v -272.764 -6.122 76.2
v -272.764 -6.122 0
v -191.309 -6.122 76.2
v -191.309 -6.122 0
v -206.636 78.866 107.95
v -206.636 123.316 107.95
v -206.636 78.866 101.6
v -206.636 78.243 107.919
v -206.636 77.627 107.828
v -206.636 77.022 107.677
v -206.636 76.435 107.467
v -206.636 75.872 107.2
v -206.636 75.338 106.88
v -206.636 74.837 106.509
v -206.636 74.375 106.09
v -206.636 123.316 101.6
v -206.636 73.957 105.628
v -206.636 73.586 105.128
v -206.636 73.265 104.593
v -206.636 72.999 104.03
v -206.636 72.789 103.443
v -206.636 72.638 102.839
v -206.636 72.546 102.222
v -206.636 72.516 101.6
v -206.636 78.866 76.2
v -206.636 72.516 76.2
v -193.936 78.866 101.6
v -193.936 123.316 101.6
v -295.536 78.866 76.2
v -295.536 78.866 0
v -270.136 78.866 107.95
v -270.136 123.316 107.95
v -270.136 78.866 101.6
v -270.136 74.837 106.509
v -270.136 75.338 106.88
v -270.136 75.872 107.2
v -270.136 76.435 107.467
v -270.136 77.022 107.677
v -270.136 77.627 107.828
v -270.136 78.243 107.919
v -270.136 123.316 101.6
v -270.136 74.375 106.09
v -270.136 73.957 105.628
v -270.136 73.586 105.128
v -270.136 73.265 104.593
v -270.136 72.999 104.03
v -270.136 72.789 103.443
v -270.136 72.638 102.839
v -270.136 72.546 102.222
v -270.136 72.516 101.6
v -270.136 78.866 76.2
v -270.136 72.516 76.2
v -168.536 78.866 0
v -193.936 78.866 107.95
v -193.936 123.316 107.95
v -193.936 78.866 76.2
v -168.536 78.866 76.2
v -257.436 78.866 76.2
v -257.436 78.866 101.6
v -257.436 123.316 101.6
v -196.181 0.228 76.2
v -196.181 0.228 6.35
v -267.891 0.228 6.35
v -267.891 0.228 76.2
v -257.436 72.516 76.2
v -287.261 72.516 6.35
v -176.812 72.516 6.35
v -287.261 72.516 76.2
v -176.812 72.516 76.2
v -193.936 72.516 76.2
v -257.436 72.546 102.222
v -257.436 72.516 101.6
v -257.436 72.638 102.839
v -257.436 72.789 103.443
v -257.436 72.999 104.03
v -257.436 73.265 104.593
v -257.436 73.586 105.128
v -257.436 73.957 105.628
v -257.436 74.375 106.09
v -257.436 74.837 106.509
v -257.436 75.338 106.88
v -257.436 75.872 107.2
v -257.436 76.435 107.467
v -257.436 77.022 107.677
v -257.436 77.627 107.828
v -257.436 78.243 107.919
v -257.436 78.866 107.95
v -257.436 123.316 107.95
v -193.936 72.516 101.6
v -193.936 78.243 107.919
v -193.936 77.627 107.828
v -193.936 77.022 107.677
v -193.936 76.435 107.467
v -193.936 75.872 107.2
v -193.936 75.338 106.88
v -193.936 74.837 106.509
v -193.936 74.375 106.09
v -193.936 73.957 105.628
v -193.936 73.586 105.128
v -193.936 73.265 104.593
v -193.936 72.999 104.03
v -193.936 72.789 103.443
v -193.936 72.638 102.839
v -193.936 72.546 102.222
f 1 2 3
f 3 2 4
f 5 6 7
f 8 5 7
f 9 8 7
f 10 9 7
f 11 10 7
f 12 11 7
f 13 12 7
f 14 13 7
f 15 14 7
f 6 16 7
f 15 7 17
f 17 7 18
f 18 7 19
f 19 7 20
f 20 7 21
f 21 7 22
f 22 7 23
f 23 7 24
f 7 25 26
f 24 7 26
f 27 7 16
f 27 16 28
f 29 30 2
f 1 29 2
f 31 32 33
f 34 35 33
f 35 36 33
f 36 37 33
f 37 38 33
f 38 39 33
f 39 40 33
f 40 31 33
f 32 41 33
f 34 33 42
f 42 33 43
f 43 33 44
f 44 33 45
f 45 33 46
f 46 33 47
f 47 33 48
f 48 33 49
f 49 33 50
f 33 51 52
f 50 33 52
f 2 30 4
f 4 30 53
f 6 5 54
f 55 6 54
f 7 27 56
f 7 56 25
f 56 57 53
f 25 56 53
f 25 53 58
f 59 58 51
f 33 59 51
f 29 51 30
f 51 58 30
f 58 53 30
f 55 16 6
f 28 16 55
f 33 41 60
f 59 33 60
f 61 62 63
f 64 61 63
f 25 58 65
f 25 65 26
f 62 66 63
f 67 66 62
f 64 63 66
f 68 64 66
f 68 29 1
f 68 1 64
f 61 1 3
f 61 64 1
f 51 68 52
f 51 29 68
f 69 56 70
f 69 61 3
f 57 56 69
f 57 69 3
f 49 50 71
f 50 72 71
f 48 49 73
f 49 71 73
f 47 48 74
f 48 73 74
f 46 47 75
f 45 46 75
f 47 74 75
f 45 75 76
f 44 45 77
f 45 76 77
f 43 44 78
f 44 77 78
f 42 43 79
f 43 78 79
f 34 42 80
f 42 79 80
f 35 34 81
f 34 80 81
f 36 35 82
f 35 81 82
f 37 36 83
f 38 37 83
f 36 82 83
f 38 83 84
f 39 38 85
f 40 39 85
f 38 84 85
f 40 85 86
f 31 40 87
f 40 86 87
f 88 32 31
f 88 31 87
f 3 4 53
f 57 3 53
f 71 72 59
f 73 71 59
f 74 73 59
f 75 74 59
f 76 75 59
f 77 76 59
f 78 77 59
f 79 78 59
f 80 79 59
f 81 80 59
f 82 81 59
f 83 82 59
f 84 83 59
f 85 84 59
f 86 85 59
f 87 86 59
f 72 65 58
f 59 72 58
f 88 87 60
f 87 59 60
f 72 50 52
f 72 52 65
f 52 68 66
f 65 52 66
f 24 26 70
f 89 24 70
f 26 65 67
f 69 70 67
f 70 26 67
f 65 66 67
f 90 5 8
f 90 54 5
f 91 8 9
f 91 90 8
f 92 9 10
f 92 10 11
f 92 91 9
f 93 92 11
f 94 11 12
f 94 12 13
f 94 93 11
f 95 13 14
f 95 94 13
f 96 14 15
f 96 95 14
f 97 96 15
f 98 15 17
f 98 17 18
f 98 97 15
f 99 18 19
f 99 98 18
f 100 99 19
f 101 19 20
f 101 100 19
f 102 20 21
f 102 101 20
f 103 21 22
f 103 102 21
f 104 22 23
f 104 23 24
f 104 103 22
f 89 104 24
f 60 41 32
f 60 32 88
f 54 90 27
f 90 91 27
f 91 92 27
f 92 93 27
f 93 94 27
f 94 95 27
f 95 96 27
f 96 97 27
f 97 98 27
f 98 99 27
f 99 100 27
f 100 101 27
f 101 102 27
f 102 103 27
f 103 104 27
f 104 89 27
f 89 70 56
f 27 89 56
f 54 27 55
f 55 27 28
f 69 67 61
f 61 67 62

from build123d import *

# Parameters (mm, degrees)
F1_DEPTH = 76.2
F2_DEPTH = 6.35
F3_W     = 12.7
F3_H     = 25.4
F4_DEPTH = 6.35
F5_W     = 12.7
F5_H     = 6.35
F5_H_2   = 44.45
F6_DEPTH = 6.35
F7_W     = 12.7
F7_H     = 44.45
F7_H_2   = 6.35
F8_DEPTH = 6.35
F9_R     = 6.35
F10_R    = 6.35


with BuildPart() as f1:
    # F0 (on Top) → F1 (new body)
    with BuildSketch(Plane.XY):
        Polygon((-191.3085826457, -6.122033637), (-168.5362336709, 78.8655297446), (-295.5362336709, 78.8655297446), (-272.7638846962, -6.122033637), align=None)
        Polygon((-267.8913583225, 0.227966363), (-287.2607525534, 72.5155297446), (-176.8117147885, 72.5155297446), (-196.1811090194, 0.227966363), align=None, mode=Mode.SUBTRACT)
    extrude(amount=F1_DEPTH)

    # F0 (on Top) → F2 (join)
    with BuildSketch(Plane.XY):
        Polygon((-176.8117147885, 72.5155297446), (-287.2607525534, 72.5155297446), (-267.8913583225, 0.227966363), (-196.1811090194, 0.227966363), align=None)
    extrude(amount=F2_DEPTH)

    # F3 (on face) → F4 (join)
    with BuildSketch(Plane(origin=(0, 78.8655297446, 0), x_dir=(-1, 0, 0), z_dir=(0, 1, 0))):
        with Locations((200.2862336709, 88.9)):
            Rectangle(F3_W, F3_H)
        with Locations((263.7862336709, 88.9)):
            Rectangle(F3_W, F3_H)
    extrude(amount=-F4_DEPTH)

    # F5 (on face) → F6 (join)
    with BuildSketch(Plane.XY.offset(101.6)):
        with Locations((-200.2862336709, 75.6905297446)):
            Rectangle(F5_W, F5_H)
        with Locations((-200.2862336709, 101.0905297446)):
            Rectangle(F5_W, F5_H_2)
    extrude(amount=F6_DEPTH)

    # F7 (on face) → F8 (join)
    with BuildSketch(Plane.XY.offset(101.6)):
        with Locations((-263.7862336709, 101.0905297446)):
            Rectangle(F7_W, F7_H)
        with Locations((-263.7862336709, 75.6905297446)):
            Rectangle(F7_W, F7_H_2)
    extrude(amount=F8_DEPTH)

    # F9
    f9_edges = [f1.edges().sort_by_distance(p)[0] for p in [
        (-200.286234, 72.51553, 107.95),
    ]]
    fillet(f9_edges, radius=F9_R)

    # F10
    f10_edges = [f1.edges().sort_by_distance(p)[0] for p in [
        (-263.786234, 72.51553, 107.95),
    ]]
    fillet(f10_edges, radius=F10_R)


solid = f1.part
